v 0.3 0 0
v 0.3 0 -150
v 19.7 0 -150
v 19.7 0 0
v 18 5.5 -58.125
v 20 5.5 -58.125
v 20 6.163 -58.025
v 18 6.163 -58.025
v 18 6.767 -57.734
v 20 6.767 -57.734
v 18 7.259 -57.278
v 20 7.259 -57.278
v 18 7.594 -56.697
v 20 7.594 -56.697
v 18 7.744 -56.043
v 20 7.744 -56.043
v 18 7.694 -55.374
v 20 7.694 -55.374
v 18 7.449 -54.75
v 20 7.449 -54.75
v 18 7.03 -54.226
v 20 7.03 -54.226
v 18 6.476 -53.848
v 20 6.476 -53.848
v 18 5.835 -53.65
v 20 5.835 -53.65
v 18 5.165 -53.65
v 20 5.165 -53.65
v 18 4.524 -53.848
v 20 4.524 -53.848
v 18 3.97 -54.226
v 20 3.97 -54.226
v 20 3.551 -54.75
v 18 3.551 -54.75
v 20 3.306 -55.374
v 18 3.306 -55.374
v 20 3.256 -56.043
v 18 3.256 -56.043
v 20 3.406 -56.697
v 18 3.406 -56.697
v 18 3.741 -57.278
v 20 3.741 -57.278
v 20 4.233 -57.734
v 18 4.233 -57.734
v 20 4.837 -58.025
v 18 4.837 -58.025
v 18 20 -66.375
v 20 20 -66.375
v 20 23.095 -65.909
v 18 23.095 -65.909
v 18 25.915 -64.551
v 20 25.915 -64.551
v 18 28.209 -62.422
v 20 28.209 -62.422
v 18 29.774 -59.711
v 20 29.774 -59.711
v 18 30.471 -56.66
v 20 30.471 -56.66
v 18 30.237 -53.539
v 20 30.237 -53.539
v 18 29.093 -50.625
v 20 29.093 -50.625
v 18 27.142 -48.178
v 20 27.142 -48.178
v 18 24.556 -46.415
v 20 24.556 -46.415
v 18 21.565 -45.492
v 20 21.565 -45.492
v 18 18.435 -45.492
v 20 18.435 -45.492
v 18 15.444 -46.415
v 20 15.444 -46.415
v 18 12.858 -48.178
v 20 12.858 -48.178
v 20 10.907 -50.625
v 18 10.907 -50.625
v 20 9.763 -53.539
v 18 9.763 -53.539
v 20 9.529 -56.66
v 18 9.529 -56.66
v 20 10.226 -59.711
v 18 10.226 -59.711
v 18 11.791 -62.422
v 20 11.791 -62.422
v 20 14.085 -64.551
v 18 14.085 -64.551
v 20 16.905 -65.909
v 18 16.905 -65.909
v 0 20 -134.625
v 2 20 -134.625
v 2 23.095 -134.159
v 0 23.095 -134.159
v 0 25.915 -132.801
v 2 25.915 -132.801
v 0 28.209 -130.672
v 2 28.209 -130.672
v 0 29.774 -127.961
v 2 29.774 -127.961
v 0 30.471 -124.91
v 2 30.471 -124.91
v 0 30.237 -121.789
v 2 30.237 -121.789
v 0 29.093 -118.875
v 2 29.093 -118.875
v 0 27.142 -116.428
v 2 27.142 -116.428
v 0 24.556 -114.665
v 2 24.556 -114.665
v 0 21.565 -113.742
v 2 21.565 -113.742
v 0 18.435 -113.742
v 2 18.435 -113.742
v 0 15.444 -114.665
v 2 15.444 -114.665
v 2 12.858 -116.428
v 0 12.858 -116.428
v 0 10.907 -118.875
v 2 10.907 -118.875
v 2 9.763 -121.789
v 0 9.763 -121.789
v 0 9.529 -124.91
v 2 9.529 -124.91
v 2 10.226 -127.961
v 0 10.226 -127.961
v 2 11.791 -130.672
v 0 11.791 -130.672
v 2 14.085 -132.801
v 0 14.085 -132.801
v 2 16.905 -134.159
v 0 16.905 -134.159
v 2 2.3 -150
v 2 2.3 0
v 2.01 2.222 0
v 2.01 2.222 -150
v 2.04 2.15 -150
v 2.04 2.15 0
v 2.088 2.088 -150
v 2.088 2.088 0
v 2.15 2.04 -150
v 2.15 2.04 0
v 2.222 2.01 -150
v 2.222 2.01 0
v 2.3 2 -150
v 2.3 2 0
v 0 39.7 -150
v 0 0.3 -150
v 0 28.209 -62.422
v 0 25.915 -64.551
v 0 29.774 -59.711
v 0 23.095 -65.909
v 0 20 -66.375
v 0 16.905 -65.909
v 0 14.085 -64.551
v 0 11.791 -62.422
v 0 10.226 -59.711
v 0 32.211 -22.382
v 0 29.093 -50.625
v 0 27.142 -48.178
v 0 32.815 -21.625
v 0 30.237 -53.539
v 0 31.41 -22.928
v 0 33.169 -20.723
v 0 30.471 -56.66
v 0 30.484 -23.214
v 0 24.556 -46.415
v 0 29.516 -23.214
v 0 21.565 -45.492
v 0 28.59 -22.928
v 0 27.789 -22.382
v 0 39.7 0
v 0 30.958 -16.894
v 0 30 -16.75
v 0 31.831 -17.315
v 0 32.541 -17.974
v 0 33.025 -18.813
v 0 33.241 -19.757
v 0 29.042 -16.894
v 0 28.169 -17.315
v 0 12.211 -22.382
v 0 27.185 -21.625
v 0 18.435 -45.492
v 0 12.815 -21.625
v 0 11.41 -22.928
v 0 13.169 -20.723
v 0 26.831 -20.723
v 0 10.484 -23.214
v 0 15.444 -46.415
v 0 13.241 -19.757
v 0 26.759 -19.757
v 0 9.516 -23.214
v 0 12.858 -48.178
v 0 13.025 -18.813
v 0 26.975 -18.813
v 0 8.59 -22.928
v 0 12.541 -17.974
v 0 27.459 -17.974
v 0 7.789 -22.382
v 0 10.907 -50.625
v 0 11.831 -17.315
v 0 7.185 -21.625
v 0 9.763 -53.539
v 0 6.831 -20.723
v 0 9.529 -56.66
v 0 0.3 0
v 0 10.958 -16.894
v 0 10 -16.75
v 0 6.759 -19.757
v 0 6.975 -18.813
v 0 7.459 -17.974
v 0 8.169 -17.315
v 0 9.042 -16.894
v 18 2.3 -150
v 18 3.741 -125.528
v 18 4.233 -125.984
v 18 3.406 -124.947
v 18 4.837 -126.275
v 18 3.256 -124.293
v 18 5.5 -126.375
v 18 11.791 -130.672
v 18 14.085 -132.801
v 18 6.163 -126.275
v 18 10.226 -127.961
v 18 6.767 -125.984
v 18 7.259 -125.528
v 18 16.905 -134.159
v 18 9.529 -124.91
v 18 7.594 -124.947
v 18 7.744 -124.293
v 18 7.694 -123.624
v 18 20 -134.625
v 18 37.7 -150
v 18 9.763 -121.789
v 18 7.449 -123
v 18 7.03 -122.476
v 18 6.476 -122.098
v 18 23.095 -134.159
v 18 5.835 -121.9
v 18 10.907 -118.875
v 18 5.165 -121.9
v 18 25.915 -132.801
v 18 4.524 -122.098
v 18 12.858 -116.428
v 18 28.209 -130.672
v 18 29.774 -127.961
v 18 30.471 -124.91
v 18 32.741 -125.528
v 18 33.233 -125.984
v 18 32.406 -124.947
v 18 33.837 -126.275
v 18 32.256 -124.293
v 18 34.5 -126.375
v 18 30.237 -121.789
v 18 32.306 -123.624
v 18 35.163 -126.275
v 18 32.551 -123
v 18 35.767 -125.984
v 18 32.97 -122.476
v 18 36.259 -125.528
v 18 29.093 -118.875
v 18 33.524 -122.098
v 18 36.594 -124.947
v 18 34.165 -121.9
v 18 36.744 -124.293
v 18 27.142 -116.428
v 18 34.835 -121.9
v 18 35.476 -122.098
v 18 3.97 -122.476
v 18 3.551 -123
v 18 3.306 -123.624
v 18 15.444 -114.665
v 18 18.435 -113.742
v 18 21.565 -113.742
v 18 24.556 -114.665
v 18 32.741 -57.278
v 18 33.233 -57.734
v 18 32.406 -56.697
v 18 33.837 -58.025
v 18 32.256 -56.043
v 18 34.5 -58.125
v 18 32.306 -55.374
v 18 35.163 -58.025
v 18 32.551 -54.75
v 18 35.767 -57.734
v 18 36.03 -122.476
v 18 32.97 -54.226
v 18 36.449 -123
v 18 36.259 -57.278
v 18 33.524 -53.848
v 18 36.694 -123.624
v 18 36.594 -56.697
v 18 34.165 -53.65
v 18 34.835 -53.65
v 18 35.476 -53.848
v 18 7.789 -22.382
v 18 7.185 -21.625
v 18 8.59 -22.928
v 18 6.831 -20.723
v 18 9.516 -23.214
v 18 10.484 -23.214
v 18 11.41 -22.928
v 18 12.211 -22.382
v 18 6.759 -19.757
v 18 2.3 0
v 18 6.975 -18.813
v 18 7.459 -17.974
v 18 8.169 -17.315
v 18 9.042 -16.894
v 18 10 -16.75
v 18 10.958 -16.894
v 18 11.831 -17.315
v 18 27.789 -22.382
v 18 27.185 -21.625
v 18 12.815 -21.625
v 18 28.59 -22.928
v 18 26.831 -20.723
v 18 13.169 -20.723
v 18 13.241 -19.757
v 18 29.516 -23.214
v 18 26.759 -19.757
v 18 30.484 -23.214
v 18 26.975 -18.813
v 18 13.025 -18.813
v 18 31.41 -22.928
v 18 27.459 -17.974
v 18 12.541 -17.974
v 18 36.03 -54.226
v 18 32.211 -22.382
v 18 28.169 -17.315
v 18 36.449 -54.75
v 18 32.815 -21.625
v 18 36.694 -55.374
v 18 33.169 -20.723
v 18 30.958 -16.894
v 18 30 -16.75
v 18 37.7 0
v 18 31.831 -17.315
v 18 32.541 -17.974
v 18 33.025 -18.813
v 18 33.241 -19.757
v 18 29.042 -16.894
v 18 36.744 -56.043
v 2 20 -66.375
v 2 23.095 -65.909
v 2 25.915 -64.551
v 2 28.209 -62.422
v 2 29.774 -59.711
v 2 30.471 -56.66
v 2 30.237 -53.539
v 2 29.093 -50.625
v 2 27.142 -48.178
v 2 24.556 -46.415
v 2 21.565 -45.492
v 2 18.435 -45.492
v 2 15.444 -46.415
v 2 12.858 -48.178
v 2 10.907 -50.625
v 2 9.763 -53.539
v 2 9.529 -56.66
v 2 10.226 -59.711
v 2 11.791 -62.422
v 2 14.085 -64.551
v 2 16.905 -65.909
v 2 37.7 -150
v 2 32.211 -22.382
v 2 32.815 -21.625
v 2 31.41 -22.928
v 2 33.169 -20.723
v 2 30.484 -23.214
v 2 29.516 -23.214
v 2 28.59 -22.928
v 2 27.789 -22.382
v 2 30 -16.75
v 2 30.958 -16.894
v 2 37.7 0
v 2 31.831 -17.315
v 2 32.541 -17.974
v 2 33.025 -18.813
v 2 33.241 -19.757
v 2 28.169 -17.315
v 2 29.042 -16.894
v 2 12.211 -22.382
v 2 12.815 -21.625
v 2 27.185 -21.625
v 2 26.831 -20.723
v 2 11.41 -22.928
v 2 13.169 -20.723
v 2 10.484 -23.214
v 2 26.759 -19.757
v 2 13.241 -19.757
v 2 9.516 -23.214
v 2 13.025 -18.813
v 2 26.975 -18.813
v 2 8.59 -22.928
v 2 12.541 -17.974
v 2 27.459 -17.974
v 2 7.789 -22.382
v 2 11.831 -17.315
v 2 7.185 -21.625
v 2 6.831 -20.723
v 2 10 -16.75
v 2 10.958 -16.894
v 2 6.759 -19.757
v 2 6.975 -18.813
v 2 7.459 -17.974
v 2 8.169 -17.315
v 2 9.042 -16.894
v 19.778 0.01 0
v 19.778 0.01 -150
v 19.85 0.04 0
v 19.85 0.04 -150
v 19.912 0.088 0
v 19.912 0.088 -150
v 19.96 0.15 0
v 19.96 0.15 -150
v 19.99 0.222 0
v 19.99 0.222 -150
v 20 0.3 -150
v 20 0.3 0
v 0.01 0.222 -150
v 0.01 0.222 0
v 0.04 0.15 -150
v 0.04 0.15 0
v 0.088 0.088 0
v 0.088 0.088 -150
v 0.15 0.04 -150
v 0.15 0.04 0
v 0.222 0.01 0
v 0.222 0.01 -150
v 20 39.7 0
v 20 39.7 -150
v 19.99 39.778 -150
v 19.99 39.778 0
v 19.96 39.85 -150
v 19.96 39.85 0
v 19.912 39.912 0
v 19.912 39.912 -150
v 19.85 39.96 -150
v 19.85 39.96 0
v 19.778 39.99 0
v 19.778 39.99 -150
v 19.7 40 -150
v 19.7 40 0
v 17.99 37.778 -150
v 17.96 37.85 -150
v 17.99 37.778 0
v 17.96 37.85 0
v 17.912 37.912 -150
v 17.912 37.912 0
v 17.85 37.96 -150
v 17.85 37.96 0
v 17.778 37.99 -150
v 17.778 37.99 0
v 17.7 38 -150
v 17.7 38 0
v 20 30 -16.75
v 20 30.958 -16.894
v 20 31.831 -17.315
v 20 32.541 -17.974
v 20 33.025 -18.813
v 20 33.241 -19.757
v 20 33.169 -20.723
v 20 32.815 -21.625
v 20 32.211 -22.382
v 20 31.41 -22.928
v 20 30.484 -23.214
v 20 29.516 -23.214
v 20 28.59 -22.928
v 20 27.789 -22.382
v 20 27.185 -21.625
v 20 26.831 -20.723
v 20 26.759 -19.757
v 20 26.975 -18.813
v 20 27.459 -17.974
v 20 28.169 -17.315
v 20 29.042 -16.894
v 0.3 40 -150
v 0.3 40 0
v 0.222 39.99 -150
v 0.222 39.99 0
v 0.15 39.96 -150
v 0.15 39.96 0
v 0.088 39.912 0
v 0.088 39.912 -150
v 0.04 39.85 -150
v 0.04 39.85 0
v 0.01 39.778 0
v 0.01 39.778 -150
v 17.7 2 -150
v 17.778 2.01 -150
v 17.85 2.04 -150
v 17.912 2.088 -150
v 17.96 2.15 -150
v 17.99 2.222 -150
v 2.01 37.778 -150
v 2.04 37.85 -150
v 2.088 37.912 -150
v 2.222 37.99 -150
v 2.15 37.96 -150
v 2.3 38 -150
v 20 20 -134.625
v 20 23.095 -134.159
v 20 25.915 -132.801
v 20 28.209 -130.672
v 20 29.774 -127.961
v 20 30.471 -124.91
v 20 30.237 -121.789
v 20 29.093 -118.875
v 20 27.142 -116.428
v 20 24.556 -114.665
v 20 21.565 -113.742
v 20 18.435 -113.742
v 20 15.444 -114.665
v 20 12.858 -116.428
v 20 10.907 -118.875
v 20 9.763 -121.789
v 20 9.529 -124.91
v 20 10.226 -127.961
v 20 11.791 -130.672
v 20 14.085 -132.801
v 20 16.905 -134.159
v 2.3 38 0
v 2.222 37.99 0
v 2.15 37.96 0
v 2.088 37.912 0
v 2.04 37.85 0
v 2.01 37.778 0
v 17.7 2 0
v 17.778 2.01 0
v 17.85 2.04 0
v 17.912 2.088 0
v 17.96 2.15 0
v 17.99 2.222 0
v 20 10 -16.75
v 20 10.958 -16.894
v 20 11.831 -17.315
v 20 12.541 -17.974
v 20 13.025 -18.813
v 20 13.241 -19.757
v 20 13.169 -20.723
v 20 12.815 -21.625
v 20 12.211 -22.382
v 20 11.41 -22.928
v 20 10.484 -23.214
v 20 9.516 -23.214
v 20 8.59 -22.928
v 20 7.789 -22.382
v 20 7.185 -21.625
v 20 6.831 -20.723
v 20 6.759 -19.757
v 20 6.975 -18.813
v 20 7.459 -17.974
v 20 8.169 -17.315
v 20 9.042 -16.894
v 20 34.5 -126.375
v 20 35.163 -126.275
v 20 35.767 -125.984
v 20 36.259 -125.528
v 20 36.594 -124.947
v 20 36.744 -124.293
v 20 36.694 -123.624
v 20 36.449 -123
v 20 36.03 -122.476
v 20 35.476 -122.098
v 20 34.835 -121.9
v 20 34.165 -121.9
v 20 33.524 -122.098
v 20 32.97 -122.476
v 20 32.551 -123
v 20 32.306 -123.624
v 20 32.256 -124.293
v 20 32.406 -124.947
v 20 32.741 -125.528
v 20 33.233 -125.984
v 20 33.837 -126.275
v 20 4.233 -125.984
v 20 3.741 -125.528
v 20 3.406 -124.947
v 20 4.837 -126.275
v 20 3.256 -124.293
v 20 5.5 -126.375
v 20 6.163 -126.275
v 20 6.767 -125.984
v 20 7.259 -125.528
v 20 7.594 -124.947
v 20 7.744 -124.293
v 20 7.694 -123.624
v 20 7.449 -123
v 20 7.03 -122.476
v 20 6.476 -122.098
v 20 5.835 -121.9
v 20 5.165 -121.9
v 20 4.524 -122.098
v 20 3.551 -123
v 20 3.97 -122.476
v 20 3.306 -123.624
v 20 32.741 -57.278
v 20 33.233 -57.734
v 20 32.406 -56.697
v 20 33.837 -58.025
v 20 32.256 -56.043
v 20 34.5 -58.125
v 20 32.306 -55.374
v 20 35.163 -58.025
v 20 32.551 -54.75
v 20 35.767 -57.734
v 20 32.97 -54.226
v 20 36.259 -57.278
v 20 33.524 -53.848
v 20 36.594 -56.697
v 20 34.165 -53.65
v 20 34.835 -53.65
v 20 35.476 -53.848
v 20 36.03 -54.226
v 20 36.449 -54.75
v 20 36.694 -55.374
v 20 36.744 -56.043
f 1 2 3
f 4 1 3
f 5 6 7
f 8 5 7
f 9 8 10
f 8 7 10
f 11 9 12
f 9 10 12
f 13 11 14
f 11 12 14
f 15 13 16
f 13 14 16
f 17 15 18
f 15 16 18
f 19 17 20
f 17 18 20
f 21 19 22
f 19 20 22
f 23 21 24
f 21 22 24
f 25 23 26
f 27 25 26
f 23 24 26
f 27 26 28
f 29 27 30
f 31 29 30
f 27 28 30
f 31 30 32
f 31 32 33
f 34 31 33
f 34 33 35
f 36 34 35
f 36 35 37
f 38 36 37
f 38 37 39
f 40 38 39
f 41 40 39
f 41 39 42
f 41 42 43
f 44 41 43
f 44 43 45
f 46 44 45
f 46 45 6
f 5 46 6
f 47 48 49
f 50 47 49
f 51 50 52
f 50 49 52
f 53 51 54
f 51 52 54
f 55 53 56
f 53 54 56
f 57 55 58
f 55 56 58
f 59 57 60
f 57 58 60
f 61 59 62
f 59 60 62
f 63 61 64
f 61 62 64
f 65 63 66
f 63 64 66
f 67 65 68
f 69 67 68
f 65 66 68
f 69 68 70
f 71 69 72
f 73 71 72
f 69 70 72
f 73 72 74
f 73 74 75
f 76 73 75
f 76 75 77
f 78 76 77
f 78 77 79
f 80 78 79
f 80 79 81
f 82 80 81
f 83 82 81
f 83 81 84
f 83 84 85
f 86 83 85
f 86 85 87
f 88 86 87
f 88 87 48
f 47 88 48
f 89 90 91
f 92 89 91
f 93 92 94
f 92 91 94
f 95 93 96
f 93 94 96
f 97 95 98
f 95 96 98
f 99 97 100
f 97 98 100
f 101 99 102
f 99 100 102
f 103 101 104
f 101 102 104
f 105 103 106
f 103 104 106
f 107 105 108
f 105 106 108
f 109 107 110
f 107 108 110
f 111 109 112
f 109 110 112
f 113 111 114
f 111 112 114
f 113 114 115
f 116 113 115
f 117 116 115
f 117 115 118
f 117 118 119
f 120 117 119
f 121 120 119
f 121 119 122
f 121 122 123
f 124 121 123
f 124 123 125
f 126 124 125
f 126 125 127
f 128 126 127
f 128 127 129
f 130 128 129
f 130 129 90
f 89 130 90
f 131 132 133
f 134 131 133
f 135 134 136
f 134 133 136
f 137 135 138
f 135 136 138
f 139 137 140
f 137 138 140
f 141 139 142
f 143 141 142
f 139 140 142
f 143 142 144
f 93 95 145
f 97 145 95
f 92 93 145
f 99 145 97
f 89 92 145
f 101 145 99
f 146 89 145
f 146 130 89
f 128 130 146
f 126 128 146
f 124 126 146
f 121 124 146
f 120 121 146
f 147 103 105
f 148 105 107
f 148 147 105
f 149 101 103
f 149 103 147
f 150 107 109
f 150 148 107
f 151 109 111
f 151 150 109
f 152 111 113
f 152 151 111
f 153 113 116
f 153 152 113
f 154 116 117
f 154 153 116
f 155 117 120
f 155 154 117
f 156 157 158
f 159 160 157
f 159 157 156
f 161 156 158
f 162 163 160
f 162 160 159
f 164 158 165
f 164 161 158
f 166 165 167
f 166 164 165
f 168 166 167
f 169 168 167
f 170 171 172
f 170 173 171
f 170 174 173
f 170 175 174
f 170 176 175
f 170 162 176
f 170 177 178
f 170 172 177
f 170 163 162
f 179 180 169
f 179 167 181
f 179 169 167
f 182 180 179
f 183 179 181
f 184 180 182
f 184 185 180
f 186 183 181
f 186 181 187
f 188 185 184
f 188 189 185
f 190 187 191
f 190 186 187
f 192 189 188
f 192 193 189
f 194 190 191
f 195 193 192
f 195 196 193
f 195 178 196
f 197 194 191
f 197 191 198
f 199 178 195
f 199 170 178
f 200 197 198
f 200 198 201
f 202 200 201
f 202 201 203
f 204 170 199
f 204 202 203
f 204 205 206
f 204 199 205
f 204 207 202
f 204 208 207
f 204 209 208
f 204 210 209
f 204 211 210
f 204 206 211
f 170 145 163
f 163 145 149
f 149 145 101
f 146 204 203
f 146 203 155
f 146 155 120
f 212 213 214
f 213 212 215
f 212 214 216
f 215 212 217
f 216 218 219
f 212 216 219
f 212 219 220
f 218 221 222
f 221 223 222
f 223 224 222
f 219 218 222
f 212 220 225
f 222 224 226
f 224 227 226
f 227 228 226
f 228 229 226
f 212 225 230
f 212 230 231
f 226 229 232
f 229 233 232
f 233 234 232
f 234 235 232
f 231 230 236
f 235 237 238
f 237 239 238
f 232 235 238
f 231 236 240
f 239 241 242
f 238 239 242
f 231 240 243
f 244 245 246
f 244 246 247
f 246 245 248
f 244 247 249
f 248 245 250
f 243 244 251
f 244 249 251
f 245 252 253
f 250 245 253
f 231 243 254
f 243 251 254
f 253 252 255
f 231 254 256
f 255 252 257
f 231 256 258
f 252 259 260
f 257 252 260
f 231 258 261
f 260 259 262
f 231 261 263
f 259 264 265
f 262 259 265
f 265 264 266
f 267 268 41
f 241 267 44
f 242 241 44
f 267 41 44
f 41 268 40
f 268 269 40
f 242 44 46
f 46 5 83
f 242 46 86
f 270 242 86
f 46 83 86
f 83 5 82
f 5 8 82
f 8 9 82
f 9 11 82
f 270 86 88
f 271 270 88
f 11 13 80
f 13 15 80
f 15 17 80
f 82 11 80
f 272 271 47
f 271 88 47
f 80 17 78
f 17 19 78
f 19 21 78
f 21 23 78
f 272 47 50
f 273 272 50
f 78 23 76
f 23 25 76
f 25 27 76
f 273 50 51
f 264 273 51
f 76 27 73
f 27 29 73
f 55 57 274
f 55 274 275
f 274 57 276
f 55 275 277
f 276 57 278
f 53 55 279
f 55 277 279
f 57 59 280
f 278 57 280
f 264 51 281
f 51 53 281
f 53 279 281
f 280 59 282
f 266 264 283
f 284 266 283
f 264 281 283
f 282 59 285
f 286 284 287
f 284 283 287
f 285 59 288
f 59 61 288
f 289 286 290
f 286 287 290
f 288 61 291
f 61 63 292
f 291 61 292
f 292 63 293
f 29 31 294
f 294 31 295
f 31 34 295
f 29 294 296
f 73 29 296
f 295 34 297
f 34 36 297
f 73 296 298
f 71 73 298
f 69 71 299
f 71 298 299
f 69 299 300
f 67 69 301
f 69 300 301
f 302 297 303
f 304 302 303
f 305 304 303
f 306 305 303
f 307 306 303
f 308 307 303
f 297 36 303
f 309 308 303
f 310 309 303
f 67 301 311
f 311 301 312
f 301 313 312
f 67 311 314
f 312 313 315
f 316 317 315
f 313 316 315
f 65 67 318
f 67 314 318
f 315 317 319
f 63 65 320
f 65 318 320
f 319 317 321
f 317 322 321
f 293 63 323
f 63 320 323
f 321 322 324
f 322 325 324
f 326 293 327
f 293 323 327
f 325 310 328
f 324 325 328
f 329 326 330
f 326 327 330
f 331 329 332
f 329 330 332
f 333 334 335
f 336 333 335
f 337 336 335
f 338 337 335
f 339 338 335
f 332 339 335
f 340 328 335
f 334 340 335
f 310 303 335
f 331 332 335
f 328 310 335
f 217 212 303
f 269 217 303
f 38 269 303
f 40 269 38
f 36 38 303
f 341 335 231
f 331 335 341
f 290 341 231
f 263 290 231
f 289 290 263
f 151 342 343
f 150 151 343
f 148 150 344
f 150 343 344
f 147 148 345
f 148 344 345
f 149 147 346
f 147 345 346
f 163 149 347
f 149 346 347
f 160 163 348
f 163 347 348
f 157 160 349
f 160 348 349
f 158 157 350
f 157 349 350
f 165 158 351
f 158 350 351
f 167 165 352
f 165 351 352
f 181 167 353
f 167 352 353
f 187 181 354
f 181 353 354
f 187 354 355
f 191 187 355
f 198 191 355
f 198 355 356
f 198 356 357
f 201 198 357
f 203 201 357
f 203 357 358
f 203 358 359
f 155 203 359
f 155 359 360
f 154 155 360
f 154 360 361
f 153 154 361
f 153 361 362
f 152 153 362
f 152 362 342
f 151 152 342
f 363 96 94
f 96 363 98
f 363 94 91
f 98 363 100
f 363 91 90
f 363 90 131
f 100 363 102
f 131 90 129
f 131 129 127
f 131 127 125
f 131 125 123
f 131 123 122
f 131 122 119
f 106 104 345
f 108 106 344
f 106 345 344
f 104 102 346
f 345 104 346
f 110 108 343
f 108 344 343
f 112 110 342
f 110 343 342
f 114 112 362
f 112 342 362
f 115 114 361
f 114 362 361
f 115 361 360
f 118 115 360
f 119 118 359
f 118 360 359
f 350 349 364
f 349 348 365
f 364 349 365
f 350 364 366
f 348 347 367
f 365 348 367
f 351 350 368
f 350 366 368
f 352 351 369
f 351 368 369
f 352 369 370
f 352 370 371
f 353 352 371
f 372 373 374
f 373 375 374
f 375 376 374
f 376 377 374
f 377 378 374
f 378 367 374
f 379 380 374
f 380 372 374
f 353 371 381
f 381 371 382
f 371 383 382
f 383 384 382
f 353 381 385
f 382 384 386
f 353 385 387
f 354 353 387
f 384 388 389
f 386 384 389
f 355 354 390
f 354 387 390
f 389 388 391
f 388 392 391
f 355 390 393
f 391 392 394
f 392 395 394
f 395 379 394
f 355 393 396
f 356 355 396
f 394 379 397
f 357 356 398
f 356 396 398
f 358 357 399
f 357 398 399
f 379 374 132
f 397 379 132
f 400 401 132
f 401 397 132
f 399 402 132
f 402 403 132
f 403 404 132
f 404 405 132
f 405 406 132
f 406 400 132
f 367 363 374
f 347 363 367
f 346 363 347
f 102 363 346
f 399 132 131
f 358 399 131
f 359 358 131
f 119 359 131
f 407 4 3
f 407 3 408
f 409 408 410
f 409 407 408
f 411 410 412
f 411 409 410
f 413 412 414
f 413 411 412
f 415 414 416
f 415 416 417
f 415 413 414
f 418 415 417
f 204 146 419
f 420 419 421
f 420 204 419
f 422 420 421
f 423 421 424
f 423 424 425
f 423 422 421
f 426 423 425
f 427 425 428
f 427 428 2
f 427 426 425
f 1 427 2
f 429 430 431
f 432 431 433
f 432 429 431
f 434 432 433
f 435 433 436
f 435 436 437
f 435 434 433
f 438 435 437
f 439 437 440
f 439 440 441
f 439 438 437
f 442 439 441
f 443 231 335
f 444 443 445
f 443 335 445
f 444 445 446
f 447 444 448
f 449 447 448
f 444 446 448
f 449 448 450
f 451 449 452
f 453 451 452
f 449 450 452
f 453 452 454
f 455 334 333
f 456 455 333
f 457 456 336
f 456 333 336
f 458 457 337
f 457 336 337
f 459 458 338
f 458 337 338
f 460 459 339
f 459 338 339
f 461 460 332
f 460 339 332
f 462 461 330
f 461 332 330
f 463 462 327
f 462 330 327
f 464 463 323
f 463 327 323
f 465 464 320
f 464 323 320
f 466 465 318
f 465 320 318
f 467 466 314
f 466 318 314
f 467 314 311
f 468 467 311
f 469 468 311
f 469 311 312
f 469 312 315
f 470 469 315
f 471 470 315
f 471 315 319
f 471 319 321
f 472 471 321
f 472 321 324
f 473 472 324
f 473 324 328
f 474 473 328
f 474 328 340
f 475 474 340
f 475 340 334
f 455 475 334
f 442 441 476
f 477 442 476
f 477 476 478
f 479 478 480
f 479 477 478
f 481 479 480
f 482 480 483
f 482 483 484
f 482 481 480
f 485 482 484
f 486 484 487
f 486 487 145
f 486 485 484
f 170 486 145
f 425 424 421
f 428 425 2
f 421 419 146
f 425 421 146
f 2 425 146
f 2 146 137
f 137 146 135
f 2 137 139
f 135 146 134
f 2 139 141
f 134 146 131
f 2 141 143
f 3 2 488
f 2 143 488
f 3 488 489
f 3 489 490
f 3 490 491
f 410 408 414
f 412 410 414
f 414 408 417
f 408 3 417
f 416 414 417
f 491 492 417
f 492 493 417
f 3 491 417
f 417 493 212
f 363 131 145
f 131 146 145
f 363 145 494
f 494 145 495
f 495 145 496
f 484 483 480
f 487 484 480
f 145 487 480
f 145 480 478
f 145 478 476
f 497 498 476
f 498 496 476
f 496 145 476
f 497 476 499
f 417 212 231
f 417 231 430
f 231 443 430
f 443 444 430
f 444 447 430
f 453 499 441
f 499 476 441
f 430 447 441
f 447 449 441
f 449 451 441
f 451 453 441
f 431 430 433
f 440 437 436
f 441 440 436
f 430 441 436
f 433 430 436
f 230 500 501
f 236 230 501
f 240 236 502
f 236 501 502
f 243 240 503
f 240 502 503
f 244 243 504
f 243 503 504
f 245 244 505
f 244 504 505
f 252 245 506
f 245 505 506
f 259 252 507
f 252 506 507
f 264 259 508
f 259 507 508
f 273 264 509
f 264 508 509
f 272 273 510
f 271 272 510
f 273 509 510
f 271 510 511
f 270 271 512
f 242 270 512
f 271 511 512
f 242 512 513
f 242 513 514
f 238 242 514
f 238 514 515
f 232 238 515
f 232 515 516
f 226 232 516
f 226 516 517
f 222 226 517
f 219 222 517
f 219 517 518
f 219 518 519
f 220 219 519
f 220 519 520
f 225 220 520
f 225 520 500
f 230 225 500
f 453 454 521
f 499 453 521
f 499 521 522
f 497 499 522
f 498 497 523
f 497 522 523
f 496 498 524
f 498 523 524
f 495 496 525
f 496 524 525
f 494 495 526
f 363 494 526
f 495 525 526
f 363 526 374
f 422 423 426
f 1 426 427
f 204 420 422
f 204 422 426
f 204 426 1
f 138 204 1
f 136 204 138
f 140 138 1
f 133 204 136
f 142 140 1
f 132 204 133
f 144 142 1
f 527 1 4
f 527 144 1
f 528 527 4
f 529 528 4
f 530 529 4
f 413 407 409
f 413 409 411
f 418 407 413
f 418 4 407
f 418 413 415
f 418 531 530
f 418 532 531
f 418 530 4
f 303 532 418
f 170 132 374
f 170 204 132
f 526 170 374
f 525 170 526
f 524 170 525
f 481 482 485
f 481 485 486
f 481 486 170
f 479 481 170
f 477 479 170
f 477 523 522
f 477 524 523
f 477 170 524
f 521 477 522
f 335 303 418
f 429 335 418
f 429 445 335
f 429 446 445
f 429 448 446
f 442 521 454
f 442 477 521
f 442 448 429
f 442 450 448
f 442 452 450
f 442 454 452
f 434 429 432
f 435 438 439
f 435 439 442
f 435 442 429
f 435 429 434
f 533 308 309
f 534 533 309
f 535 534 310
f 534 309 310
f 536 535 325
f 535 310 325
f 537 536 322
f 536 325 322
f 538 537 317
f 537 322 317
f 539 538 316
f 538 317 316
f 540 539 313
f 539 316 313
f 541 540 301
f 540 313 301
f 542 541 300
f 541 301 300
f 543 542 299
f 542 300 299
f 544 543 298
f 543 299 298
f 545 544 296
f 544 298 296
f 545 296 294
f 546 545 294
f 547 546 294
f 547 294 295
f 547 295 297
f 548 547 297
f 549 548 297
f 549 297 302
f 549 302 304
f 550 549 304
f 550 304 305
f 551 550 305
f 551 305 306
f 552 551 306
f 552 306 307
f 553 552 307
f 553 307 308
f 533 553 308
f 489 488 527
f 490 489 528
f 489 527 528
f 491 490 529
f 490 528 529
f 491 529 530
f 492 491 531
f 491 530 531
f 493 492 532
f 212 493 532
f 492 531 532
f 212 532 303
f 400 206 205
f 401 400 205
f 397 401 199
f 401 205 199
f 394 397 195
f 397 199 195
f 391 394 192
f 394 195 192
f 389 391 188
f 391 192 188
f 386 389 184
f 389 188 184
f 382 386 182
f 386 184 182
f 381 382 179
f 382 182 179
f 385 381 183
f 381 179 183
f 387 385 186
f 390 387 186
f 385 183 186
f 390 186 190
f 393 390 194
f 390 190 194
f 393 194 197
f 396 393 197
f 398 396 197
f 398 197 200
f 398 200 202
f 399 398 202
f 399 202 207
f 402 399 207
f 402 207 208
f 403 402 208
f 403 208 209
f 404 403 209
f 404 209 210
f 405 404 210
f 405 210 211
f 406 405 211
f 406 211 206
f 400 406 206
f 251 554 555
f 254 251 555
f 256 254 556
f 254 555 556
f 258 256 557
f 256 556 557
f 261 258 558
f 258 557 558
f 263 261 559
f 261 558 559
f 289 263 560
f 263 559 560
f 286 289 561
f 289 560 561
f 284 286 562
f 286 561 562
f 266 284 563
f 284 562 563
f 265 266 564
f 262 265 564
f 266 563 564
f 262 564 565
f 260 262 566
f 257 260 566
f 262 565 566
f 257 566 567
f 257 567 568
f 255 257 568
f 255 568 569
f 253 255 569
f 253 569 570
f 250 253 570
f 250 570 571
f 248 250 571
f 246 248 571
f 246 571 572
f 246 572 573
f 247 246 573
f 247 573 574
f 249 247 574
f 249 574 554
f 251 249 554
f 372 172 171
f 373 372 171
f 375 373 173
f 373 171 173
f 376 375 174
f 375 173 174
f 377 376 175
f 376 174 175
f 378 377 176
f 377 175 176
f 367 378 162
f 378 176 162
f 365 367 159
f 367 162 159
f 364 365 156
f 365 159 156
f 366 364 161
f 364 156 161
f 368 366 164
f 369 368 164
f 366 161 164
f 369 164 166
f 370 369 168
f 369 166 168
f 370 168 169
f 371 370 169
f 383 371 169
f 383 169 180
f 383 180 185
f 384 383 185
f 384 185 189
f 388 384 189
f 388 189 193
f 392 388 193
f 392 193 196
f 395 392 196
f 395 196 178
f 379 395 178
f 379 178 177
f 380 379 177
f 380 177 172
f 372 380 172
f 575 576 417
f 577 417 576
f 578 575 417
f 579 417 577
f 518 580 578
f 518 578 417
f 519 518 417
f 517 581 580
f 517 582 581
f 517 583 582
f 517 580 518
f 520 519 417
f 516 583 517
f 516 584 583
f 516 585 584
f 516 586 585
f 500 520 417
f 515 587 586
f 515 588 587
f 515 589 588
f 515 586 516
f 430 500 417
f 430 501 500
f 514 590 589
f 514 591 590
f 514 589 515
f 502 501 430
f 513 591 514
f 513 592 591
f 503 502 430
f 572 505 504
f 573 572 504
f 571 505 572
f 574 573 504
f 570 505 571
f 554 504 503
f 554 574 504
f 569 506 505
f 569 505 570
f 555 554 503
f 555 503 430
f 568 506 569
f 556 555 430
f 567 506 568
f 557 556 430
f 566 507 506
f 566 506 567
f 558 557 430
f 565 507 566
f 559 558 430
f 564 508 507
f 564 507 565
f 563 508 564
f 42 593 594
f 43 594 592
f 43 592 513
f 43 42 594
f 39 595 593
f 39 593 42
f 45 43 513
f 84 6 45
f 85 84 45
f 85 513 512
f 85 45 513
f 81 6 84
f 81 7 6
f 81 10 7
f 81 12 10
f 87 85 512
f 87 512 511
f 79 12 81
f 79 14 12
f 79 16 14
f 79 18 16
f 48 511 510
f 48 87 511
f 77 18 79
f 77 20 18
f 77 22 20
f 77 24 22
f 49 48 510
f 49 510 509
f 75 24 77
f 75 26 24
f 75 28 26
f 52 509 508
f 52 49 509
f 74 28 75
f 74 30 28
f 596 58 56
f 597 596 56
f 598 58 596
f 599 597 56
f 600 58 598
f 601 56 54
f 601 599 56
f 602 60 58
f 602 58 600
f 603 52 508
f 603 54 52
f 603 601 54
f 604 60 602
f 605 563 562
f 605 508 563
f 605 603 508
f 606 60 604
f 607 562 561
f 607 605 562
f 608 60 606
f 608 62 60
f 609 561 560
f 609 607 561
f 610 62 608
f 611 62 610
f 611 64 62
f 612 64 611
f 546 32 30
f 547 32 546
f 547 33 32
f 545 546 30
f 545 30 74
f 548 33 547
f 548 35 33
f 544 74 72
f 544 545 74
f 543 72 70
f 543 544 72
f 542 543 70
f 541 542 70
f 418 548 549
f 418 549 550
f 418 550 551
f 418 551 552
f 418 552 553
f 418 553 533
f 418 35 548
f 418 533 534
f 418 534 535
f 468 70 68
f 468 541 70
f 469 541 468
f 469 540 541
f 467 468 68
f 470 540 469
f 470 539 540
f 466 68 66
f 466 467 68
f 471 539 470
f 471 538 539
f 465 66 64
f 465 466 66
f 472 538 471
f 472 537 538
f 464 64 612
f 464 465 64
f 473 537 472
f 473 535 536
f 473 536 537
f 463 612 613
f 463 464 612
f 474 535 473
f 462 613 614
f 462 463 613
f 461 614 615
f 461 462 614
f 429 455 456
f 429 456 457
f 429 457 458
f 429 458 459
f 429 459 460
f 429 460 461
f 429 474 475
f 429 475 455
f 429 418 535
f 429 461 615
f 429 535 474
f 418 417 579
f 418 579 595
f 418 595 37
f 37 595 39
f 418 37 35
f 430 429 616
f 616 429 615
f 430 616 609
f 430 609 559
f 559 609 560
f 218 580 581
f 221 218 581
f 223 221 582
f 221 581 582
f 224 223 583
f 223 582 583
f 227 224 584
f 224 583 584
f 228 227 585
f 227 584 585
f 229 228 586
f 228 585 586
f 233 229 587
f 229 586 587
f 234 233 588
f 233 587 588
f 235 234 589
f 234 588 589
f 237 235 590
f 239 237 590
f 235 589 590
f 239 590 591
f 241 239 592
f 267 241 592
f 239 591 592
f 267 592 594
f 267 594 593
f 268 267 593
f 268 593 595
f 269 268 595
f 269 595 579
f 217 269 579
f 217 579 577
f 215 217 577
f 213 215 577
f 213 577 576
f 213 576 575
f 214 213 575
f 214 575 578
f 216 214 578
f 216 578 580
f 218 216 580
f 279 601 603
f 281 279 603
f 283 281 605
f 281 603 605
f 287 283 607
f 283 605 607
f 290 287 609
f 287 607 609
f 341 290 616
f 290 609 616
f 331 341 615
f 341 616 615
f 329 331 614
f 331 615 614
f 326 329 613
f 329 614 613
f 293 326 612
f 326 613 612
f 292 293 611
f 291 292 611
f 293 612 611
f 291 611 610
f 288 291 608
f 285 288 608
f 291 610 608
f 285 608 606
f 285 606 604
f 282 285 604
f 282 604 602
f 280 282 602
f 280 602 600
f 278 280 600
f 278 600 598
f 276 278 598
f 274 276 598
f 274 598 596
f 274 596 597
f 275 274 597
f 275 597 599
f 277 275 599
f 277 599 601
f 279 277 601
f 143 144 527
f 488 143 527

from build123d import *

# Parameters (mm, degrees)
EXTRUDE_1_DEPTH     = 150
SKETCH_2_R          = 3.25
CUT_EXTRUDE_1_DEPTH = 157.524758425
SKETCH_3_R          = 10.5
CUT_EXTRUDE_2_DEPTH = 157.524758425
SKETCH_4_R          = 10.5
CUT_EXTRUDE_3_DEPTH = 157.524758425
SKETCH_5_R          = 2.25
CUT_EXTRUDE_4_DEPTH = 10
SKETCH_5_4_R        = 2.25
CUT_EXTRUDE_5_DEPTH = 10


with BuildPart() as part:
    # ｽｹｯﾁ1 → ﾎﾞｽ - 押し出し1 (new body)
    with BuildSketch(Plane.XY):
        with BuildLine():
            Line((0.3, 0), (19.7, 0))
            ThreePointArc((19.7, 0), (19.912132034, 0.087867966), (20, 0.3))
            Line((20, 0.3), (20, 39.7))
            ThreePointArc((20, 39.7), (19.912132034, 39.912132034), (19.7, 40))
            Line((19.7, 40), (0.3, 40))
            ThreePointArc((0.3, 40), (0.087867966, 39.912132034), (0, 39.7))
            Line((0, 39.7), (0, 0.3))
            ThreePointArc((0, 0.3), (0.087867966, 0.087867966), (0.3, 0))
        make_face()
        with BuildLine():
            Line((2.3, 2), (17.7, 2))
            ThreePointArc((17.7, 2), (17.912132034, 2.087867966), (18, 2.3))
            Line((18, 2.3), (18, 37.7))
            ThreePointArc((18, 37.7), (17.912132034, 37.912132034), (17.7, 38))
            Line((17.7, 38), (2.3, 38))
            ThreePointArc((2.3, 38), (2.087867966, 37.912132034), (2, 37.7))
            Line((2, 37.7), (2, 2.3))
            ThreePointArc((2, 2.3), (2.087867966, 2.087867966), (2.3, 2))
        make_face(mode=Mode.SUBTRACT)
    extrude(amount=-EXTRUDE_1_DEPTH)

    # ｽｹｯﾁ2 → ｶｯﾄ - 押し出し1 (cut, through all)
    with BuildSketch(Plane.ZY):
        with Locations((-20, 30)):
            Circle(SKETCH_2_R)
        with Locations((-20, 10)):
            Circle(SKETCH_2_R)
    extrude(amount=-CUT_EXTRUDE_1_DEPTH, mode=Mode.SUBTRACT)

    # ｽｹｯﾁ3 → ｶｯﾄ - 押し出し2 (cut, through all)
    with BuildSketch(Plane(origin=(20, 0, 0), x_dir=(0, 0, -1), z_dir=(1, 0, 0))):
        with Locations((124.125, 20)):
            Circle(SKETCH_3_R)
    extrude(amount=-CUT_EXTRUDE_2_DEPTH, mode=Mode.SUBTRACT)

    # ｽｹｯﾁ4 → ｶｯﾄ - 押し出し3 (cut, through all)
    with BuildSketch(Plane(origin=(20, 0, 0), x_dir=(0, 0, -1), z_dir=(1, 0, 0))):
        with Locations((55.875, 20)):
            Circle(SKETCH_4_R)
    extrude(amount=-CUT_EXTRUDE_3_DEPTH, mode=Mode.SUBTRACT)

    # ｽｹｯﾁ5 → ｶｯﾄ - 押し出し4 (cut)
    with BuildSketch(Plane(origin=(20, 0, 0), x_dir=(0, 0, -1), z_dir=(1, 0, 0))):
        with Locations((124.125, 5.5)):
            Circle(SKETCH_5_R)
    extrude(amount=-CUT_EXTRUDE_4_DEPTH, mode=Mode.SUBTRACT)

    # ｽｹｯﾁ5<4> → ｶｯﾄ - 押し出し5 (cut)
    with BuildSketch(Plane(origin=(20, 0, 0), x_dir=(0, 0, -1), z_dir=(1, 0, 0))):
        with Locations((55.875, 34.5)):
            Circle(SKETCH_5_4_R)
        with Locations((55.875, 5.5)):
            Circle(SKETCH_5_4_R)
        with Locations((124.125, 5.5)):
            Circle(SKETCH_5_4_R)
        with Locations((124.125, 34.5)):
            Circle(SKETCH_5_4_R)
    extrude(amount=-CUT_EXTRUDE_5_DEPTH, mode=Mode.SUBTRACT)


solid = part.part
